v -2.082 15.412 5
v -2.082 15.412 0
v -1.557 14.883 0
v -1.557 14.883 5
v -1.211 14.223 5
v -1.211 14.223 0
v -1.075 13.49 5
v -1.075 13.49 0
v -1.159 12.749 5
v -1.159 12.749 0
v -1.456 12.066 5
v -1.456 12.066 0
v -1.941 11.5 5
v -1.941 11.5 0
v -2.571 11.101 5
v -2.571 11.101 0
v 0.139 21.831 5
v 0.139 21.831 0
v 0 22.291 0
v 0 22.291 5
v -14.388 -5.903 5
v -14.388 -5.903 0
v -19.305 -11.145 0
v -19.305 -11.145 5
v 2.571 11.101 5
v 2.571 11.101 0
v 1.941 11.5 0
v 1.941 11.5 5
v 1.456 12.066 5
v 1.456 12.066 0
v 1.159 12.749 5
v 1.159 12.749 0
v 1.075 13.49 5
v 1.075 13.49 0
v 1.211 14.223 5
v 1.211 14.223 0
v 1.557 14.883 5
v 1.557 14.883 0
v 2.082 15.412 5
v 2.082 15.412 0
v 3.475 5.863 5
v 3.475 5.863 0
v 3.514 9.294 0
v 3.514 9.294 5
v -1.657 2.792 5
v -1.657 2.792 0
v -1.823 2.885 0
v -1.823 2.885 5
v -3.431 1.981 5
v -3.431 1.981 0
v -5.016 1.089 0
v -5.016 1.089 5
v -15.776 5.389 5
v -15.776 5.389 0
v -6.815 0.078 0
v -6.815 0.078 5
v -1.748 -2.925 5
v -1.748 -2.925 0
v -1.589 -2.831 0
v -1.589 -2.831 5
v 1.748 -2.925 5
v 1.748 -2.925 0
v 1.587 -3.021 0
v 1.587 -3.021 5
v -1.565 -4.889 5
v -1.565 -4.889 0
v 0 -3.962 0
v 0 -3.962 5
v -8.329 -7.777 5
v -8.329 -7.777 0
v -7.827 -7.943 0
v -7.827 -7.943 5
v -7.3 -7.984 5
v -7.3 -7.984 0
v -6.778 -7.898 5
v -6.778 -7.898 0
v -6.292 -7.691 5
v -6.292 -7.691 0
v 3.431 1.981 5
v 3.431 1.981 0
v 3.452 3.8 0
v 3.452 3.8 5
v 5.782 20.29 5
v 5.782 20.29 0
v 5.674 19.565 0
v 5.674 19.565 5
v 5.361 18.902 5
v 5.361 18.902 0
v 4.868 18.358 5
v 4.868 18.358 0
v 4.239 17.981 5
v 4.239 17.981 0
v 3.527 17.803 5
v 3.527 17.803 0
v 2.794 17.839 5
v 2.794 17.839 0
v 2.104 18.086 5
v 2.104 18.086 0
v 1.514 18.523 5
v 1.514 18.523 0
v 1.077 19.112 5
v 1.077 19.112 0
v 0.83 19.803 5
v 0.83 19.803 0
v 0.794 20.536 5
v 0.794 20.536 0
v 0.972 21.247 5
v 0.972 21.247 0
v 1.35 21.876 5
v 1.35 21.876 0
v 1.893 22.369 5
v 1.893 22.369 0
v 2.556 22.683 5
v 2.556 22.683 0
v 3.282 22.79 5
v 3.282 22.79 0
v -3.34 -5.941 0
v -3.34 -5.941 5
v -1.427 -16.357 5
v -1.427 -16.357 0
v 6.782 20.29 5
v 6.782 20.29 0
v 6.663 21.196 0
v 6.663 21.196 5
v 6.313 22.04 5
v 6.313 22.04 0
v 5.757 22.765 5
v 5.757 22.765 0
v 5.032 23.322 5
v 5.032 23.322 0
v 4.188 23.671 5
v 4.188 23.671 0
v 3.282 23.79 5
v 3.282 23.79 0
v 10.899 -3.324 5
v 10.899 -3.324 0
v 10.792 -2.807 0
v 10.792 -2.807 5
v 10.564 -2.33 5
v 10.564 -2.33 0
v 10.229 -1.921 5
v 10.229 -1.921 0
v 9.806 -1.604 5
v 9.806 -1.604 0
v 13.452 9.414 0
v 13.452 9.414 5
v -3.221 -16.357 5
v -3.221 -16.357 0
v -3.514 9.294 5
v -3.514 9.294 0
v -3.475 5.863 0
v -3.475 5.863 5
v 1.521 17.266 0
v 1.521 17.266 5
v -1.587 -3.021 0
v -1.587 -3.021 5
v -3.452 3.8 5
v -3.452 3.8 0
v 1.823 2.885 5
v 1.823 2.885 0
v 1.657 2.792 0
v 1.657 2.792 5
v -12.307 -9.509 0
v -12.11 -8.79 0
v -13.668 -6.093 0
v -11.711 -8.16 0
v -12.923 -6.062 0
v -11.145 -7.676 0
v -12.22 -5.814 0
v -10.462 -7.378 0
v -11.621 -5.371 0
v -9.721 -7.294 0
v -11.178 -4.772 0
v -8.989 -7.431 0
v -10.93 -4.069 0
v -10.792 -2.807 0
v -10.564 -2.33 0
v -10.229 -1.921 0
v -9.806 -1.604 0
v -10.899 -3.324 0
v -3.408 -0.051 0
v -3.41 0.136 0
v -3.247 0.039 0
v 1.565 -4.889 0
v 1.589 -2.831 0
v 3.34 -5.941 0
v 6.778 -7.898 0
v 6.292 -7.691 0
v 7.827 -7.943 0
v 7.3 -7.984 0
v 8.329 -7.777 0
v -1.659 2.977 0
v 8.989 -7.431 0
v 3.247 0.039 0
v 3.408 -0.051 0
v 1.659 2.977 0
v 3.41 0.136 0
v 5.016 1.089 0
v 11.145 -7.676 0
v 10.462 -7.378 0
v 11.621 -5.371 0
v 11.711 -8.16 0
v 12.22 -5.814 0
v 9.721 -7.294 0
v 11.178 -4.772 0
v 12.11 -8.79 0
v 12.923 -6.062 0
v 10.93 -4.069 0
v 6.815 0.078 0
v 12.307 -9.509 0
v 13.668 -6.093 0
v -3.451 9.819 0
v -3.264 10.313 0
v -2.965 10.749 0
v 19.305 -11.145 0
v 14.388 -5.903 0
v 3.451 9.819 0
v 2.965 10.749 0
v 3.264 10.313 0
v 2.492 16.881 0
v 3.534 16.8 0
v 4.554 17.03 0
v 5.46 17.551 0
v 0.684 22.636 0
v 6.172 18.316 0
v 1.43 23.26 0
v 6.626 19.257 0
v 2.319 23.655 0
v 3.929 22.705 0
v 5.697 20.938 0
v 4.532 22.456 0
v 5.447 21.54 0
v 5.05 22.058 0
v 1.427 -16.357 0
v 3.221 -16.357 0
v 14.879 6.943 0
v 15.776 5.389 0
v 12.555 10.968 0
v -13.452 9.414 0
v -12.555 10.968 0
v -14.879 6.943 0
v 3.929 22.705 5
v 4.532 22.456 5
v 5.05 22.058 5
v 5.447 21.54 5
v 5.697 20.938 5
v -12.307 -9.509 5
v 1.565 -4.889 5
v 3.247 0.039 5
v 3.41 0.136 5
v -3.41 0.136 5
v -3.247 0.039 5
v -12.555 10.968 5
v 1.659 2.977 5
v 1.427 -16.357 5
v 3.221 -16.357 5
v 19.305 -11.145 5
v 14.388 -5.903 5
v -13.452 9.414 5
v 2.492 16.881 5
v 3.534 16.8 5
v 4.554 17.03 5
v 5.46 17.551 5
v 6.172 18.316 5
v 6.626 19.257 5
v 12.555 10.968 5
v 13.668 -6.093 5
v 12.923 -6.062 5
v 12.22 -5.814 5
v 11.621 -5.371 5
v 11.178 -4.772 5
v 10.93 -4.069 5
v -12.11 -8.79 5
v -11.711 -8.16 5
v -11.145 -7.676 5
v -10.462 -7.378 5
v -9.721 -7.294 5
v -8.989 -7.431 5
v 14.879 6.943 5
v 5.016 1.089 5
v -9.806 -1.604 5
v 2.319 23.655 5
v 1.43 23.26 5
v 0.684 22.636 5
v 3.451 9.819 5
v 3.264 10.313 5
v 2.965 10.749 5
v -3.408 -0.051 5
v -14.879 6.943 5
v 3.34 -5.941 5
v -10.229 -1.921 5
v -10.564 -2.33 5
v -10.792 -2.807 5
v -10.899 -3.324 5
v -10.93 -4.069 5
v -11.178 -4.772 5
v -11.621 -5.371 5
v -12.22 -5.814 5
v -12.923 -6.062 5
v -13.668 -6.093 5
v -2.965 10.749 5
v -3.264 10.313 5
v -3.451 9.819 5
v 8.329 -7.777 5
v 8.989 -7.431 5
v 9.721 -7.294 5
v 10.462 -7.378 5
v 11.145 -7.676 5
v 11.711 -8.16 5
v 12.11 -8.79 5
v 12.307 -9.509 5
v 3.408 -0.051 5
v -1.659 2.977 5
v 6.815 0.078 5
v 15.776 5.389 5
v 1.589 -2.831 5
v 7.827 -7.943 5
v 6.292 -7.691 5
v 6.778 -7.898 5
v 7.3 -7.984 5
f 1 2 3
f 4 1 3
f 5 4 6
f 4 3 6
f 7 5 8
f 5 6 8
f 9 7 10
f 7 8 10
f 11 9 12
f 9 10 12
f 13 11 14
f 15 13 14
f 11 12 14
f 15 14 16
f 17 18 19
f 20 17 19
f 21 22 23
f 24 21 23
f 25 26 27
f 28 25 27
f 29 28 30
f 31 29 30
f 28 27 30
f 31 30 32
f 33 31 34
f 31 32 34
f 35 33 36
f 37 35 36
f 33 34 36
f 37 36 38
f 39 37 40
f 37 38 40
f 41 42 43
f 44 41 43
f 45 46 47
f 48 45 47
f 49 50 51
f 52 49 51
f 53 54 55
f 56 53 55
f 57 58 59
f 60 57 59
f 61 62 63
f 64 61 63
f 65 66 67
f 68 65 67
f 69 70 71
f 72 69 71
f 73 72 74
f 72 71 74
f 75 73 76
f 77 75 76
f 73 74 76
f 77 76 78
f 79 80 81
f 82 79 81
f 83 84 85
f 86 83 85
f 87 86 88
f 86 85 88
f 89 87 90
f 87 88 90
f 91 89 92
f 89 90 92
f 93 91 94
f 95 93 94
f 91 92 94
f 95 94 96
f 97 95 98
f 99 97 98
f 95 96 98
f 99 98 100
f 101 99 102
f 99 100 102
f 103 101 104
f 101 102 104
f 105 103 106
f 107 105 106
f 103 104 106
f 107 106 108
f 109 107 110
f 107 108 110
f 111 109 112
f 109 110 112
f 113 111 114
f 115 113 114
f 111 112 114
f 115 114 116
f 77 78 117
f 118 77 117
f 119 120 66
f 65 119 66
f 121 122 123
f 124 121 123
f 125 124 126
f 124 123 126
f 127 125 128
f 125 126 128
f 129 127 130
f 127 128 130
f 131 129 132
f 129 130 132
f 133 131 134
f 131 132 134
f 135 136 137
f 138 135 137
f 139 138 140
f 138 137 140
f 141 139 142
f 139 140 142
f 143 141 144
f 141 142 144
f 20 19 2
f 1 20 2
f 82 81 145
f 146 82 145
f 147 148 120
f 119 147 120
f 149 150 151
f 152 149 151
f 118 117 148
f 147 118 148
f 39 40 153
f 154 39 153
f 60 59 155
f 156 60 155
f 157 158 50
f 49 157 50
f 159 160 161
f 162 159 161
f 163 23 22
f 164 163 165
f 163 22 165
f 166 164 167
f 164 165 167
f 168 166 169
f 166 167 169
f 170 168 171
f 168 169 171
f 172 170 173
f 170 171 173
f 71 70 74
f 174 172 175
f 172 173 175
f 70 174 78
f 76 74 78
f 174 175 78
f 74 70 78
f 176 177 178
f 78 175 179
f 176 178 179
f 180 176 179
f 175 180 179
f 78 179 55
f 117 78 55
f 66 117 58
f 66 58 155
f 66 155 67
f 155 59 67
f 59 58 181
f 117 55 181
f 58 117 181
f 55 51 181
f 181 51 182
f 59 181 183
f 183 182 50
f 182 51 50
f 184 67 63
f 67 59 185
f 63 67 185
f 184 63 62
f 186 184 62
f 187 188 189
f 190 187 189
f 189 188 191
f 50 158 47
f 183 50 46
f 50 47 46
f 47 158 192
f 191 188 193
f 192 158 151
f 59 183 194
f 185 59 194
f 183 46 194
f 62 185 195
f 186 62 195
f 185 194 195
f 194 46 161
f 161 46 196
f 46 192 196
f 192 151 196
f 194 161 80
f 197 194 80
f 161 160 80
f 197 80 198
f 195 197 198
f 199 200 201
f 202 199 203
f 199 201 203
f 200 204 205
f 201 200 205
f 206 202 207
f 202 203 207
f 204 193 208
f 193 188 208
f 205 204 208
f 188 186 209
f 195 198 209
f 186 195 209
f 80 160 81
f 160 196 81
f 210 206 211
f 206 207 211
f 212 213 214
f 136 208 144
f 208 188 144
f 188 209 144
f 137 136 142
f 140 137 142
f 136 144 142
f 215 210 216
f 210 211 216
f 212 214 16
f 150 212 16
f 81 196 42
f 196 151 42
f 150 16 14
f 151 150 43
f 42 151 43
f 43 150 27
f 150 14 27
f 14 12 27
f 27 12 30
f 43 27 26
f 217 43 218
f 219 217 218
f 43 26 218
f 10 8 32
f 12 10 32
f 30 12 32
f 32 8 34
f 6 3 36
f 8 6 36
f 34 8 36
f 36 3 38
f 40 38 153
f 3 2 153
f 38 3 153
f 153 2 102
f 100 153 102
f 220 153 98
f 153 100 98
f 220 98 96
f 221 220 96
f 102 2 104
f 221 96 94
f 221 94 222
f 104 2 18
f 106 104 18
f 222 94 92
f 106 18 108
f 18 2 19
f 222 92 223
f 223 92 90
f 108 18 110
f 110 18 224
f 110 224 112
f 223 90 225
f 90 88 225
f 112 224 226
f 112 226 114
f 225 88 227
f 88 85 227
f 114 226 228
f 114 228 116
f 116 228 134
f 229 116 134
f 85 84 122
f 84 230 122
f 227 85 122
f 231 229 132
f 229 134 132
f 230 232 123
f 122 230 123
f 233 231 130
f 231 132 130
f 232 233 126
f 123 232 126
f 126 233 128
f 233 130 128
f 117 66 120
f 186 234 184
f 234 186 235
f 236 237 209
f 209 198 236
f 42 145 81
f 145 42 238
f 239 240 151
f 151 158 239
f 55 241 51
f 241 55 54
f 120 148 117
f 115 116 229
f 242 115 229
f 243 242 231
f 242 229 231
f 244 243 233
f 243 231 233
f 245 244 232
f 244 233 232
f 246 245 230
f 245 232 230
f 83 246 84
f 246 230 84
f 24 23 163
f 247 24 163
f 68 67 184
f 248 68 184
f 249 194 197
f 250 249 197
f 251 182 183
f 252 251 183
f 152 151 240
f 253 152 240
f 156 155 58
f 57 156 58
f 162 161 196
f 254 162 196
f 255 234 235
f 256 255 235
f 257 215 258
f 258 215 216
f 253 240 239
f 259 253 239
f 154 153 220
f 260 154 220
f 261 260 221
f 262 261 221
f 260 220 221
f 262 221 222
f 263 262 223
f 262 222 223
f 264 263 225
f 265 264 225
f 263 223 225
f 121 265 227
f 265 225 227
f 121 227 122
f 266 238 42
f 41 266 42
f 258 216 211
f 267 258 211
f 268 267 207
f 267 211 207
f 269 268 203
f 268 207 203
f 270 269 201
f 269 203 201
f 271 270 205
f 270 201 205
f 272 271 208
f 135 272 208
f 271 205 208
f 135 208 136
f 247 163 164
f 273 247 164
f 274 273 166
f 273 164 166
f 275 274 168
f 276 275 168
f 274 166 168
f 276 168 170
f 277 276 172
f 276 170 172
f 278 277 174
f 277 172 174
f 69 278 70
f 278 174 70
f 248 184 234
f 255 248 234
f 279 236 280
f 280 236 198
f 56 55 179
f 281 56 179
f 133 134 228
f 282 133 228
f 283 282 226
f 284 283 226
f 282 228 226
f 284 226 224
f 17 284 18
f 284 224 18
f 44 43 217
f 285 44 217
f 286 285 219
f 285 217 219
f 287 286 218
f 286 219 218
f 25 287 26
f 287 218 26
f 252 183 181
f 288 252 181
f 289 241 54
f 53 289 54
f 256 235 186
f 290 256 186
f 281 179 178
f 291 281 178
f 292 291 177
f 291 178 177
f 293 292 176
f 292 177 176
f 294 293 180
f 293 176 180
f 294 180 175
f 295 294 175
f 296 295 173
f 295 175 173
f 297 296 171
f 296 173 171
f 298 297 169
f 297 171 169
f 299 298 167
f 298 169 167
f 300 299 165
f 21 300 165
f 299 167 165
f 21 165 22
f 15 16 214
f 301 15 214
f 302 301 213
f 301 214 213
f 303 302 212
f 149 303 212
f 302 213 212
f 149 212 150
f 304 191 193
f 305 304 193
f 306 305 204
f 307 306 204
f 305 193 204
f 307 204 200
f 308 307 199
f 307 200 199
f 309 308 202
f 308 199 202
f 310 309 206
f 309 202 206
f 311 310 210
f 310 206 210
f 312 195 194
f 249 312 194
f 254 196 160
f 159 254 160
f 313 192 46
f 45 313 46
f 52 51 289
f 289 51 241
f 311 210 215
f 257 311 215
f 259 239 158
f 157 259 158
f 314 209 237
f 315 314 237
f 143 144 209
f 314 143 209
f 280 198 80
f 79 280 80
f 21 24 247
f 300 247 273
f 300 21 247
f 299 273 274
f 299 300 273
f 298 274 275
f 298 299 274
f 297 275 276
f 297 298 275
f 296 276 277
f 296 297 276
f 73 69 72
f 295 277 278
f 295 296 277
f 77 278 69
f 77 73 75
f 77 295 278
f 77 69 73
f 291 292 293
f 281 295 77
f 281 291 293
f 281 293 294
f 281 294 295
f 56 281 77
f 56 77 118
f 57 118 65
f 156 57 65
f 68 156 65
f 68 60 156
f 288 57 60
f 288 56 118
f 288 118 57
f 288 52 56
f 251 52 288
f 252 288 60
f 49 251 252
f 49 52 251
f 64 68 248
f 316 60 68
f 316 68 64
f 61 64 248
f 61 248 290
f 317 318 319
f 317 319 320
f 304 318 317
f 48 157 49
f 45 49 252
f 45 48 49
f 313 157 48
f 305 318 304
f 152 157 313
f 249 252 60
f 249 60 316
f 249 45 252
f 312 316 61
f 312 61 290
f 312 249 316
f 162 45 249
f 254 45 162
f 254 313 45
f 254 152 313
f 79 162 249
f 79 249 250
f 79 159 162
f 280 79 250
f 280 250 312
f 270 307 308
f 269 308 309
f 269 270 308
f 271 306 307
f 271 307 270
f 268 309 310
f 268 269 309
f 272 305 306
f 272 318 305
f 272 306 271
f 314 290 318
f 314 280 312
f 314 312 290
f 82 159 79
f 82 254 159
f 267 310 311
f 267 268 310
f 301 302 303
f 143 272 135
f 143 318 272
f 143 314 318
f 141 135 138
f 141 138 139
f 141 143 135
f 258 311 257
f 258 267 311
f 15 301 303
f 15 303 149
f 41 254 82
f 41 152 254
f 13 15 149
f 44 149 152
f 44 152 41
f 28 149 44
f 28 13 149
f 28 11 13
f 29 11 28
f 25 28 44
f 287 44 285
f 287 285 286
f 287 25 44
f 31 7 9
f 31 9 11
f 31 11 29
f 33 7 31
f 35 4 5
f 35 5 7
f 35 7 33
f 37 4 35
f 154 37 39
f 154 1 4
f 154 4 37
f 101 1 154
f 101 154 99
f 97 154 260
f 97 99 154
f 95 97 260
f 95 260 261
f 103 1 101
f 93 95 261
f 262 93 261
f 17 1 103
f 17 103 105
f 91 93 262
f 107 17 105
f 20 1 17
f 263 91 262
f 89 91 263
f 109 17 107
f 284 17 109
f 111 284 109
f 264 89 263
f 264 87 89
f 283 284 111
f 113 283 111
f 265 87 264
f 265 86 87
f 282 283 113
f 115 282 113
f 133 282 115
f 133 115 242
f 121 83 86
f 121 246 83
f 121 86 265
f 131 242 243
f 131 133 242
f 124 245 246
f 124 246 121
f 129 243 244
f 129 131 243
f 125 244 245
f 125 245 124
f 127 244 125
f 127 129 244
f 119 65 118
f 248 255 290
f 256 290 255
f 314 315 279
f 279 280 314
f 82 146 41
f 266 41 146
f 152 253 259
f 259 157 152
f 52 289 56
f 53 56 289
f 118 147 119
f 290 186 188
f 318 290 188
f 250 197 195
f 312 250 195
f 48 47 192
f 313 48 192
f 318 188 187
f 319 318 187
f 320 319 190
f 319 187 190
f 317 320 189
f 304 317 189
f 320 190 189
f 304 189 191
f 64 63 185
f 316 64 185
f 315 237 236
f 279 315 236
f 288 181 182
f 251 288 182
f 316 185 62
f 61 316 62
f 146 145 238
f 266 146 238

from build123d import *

# Parameters (mm, degrees)
F1_DEPTH = 5


with BuildPart() as f1:
    # F0 (on Top) → F1 (new body)
    with BuildSketch(Plane.XY):
        Polygon((-3.2212437924, -16.3569749735), (-1.426697038, -16.3569749735), (-1.5647196115, -4.8889417369), (-3.3402717926, -5.9412910774), align=None)
        Polygon((-3.3402717926, -5.9412910774), (-1.5647196115, -4.8889417369), (-1.5872030757, -3.0208334399), (-1.7481957552, -2.9254149319), (-3.3637788423, -3.8842792944), align=None)
        Polygon((-1.5872030757, -3.0208334399), (-1.5647196115, -4.8889417369), (0, -3.9615504336), align=None)
        with BuildLine():
            Line((-6.291840412, -7.6906518244), (-3.3402717926, -5.9412910774))
            Line((-3.3402717926, -5.9412910774), (-3.3637788423, -3.8842792944))
            Line((-3.3637788423, -3.8842792944), (-6.6341785068, -5.8252934798))
            ThreePointArc((-6.6341785068, -5.8252934798), (-7.9635745999, -6.012913211), (-9.0511064637, -5.2256587533))
            ThreePointArc((-9.0511064637, -5.2256587533), (-9.1891228915, -3.8902013029), (-8.3619413914, -2.8327203802))
            Line((-8.3619413914, -2.8327203802), (-5.0457739655, -0.9709782829))
            Line((-5.0457739655, -0.9709782829), (-6.8154449006, 0.0778853107))
            Line((-6.8154449006, 0.0778853107), (-9.8062200576, -1.6035677211))
            ThreePointArc((-9.8062200576, -1.6035677211), (-10.5638950235, -2.3297910167), (-10.8993865535, -3.3242341082))
            ThreePointArc((-10.8993865535, -3.3242341082), (-11.9036748048, -5.6152118935), (-14.3884482062, -5.9034396652))
            Line((-14.3884482062, -5.9034396652), (-19.3045690198, -11.1454981202))
            Line((-19.3045690198, -11.1454981202), (-12.3067528228, -9.509041835))
            ThreePointArc((-12.3067528228, -9.509041835), (-10.8147535498, -7.5012788326), (-8.3285644626, -7.7770285869))
            ThreePointArc((-8.3285644626, -7.7770285869), (-7.2996057177, -7.9837059449), (-6.291840412, -7.6906518244))
        make_face()
        Polygon((-1.589485169, -2.8312186468), (-1.5872030757, -3.0208334399), (0, -3.9615504336), (1.5872030757, -3.0208334399), (1.589485169, -2.8312186468), (0, -1.8878436538), align=None)
        Polygon((1.5872030757, -3.0208334399), (0, -3.9615504336), (1.5647196115, -4.8889417369), align=None)
        Polygon((1.7481957552, -2.9254149319), (1.5872030757, -3.0208334399), (1.5647196115, -4.8889417369), (3.3402717926, -5.9412910774), (3.3637788423, -3.8842792944), align=None)
        Polygon((3.3402717926, -5.9412910774), (1.5647196115, -4.8889417369), (1.426697038, -16.3569749735), (3.2212437924, -16.3569749735), align=None)
        with BuildLine():
            Line((3.3637788423, -3.8842792944), (3.3402717926, -5.9412910774))
            Line((3.3402717926, -5.9412910774), (6.291840412, -7.6906518244))
            ThreePointArc((6.291840412, -7.6906518244), (7.2996057177, -7.9837059449), (8.3285644626, -7.7770285869))
            ThreePointArc((8.3285644626, -7.7770285869), (10.8147535498, -7.5012788326), (12.3067528228, -9.509041835))
            Line((12.3067528228, -9.509041835), (19.3045690198, -11.1454981202))
            Line((19.3045690198, -11.1454981202), (14.3884482062, -5.9034396652))
            ThreePointArc((14.3884482062, -5.9034396652), (11.9036748048, -5.6152118935), (10.8993865535, -3.3242341082))
            ThreePointArc((10.8993865535, -3.3242341082), (10.5638950235, -2.3297910167), (9.8062200576, -1.6035677211))
            Line((9.8062200576, -1.6035677211), (6.8154449006, 0.0778853107))
            Line((6.8154449006, 0.0778853107), (5.0457739655, -0.9709782829))
            Line((5.0457739655, -0.9709782829), (8.3619413914, -2.8327203802))
            ThreePointArc((8.3619413914, -2.8327203802), (9.1891228915, -3.8902013029), (9.0511064637, -5.2256587533))
            ThreePointArc((9.0511064637, -5.2256587533), (7.9635745999, -6.012913211), (6.6341785068, -5.8252934798))
            Line((6.6341785068, -5.8252934798), (3.3637788423, -3.8842792944))
        make_face()
        Polygon((-5.0457739655, -0.9709782829), (-3.4075815252, -0.0512744689), (-3.4097200374, 0.1358585354), (-5.0163075475, 1.0893839351), (-6.8154449006, 0.0778853107), align=None)
        Polygon((-3.2466498563, 0.0390747881), (-1.6349205626, 0.9439218269), (-1.6571646873, 2.7921438587), (-1.8225169617, 2.8849749045), (-3.4308033139, 1.9807752168), (-3.4097200374, 0.1358585354), align=None)
        Polygon((-5.0163075475, 1.0893839351), (-3.4097200374, 0.1358585354), (-3.4308033139, 1.9807752168), align=None)
        Polygon((-15.7761777523, 5.3888085307), (-6.8154449006, 0.0778853107), (-5.0163075475, 1.0893839351), (-14.8789043751, 6.9429316084), align=None)
        Polygon((1.6571646873, 2.7921438587), (1.6349205626, 0.9439218269), (3.2466498563, 0.0390747881), (3.4097200374, 0.1358585354), (3.4308033139, 1.9807752168), (1.8225169617, 2.8849749045), align=None)
        Polygon((3.4097200374, 0.1358585354), (3.4075815252, -0.0512744689), (5.0457739655, -0.9709782829), (6.8154449006, 0.0778853107), (5.0163075475, 1.0893839351), align=None)
        Polygon((-3.451587936, 3.7995578018), (-3.4308033139, 1.9807752168), (-1.8225169617, 2.8849749045), align=None)
        Polygon((-1.8225169617, 2.8849749045), (-1.65938577, 2.9766894007), (-1.6819951232, 4.8552575774), (-3.475173108, 5.8634057666), (-3.451587936, 3.7995578018), align=None)
        Polygon((3.4308033139, 1.9807752168), (3.4097200374, 0.1358585354), (5.0163075475, 1.0893839351), align=None)
        Polygon((5.0163075475, 1.0893839351), (6.8154449006, 0.0778853107), (15.7761777523, 5.3888085307), (14.8789043751, 6.9429316084), align=None)
        Polygon((-13.4522073371, 9.4140433651), (-3.451587936, 3.7995578018), (-3.475173108, 5.8634057666), (-12.5549339599, 10.9681664428), align=None)
        with BuildLine():
            Line((-3.475173108, 5.8634057666), (-1.6819951232, 4.8552575774))
            Line((-1.6819951232, 4.8552575774), (-1.7277628846, 8.65801386))
            ThreePointArc((-1.7277628846, 8.65801386), (-1.2255482916, 9.903114514), (0, 10.4513175066))
            ThreePointArc((0, 10.4513175066), (1.2255482916, 9.903114514), (1.7277628846, 8.65801386))
            Line((1.7277628846, 8.65801386), (1.6819951232, 4.8552575774))
            Line((1.6819951232, 4.8552575774), (3.475173108, 5.8634057666))
            Line((3.475173108, 5.8634057666), (3.5143796456, 9.2942195456))
            ThreePointArc((3.5143796456, 9.2942195456), (3.2642893058, 10.3134969616), (2.570822091, 11.1012626951))
            ThreePointArc((2.570822091, 11.1012626951), (1.088921255, 13.1164907261), (2.0816953833, 15.4124815002))
            Line((2.0816953833, 15.4124815002), (1.5207536328, 17.265992888))
            ThreePointArc((1.5207536328, 17.265992888), (-0.067811393, 19.2766596681), (0.1392845209, 21.8307604932))
            Line((0.1392845209, 21.8307604932), (0, 22.2909962404))
            Line((0, 22.2909962404), (-2.0816953833, 15.4124815002))
            ThreePointArc((-2.0816953833, 15.4124815002), (-1.088921255, 13.1164907261), (-2.570822091, 11.1012626951))
            ThreePointArc((-2.570822091, 11.1012626951), (-3.2642893058, 10.3134969616), (-3.5143796456, 9.2942195456))
            Line((-3.5143796456, 9.2942195456), (-3.475173108, 5.8634057666))
        make_face()
        Polygon((1.6819951232, 4.8552575774), (1.65938577, 2.9766894007), (1.8225169617, 2.8849749045), (3.451587936, 3.7995578018), (3.475173108, 5.8634057666), align=None)
        Polygon((3.451587936, 3.7995578018), (1.8225169617, 2.8849749045), (3.4308033139, 1.9807752168), align=None)
        Polygon((3.475173108, 5.8634057666), (3.451587936, 3.7995578018), (13.4522073371, 9.4140433651), (12.5549339599, 10.9681664428), align=None)
        with BuildLine():
            ThreePointArc((3.2821391693, 23.7904797853), (1.4302458783, 23.2604109695), (0.1392845209, 21.8307604932))
            ThreePointArc((0.1392845209, 21.8307604932), (-0.067811393, 19.2766596681), (1.5207536328, 17.265992888))
            ThreePointArc((1.5207536328, 17.265992888), (5.0264371115, 17.2561059308), (6.7821391693, 20.2904797853))
            ThreePointArc((6.7821391693, 20.2904797853), (5.7570129035, 22.7653535195), (3.2821391693, 23.7904797853))
        make_face()
        with BuildLine():
            ThreePointArc((5.7821391693, 20.2904797853), (1.5143722164, 18.5227128323), (3.2821391693, 22.7904797853))
            ThreePointArc((3.2821391693, 22.7904797853), (5.0499061223, 22.0582467383), (5.7821391693, 20.2904797853))
        make_face(mode=Mode.SUBTRACT)
        Polygon((-1.6819951232, 4.8552575774), (-1.65938577, 2.9766894007), (0, 3.9096178515), align=None)
        Polygon((-1.65938577, 2.9766894007), (-1.6571646873, 2.7921438587), (0, 1.8617887637), (1.6571646873, 2.7921438587), (1.65938577, 2.9766894007), (0, 3.9096178515), align=None)
        Polygon((1.6819951232, 4.8552575774), (0, 3.9096178515), (1.65938577, 2.9766894007), align=None)
        Polygon((-5.0457739655, -0.9709782829), (-3.3858283785, -1.9548089258), (-3.4075815252, -0.0512744689), align=None)
        Polygon((-1.7481957552, -2.9254149319), (-1.589485169, -2.8312186468), (-1.6123563658, -0.9308943818), (-3.2466498563, 0.0390747881), (-3.4075815252, -0.0512744689), (-3.3858283785, -1.9548089258), align=None)
        Polygon((-3.3858283785, -1.9548089258), (-3.3637788423, -3.8842792944), (-1.7481957552, -2.9254149319), align=None)
        Polygon((-1.6571646873, 2.7921438587), (-1.6349205626, 0.9439218269), (0, 1.8617887637), align=None)
        Polygon((-3.2466498563, 0.0390747881), (-1.6123563658, -0.9308943818), (-1.6349205626, 0.9439218269), align=None)
        Polygon((1.6349205626, 0.9439218269), (1.6123563658, -0.9308943818), (3.2466498563, 0.0390747881), align=None)
        Polygon((1.6571646873, 2.7921438587), (0, 1.8617887637), (1.6349205626, 0.9439218269), align=None)
        Polygon((3.4075815252, -0.0512744689), (3.3858283785, -1.9548089258), (5.0457739655, -0.9709782829), align=None)
        Polygon((1.6123563658, -0.9308943818), (1.589485169, -2.8312186468), (1.7481957552, -2.9254149319), (3.3858283785, -1.9548089258), (3.4075815252, -0.0512744689), (3.2466498563, 0.0390747881), align=None)
        Polygon((1.6123563658, -0.9308943818), (0, -1.8878436538), (1.589485169, -2.8312186468), align=None)
        Polygon((-1.6123563658, -0.9308943818), (-1.589485169, -2.8312186468), (0, -1.8878436538), align=None)
        Polygon((3.3858283785, -1.9548089258), (1.7481957552, -2.9254149319), (3.3637788423, -3.8842792944), align=None)
        with BuildLine():
            Line((-1.7277628846, 8.65801386), (-1.6819951232, 4.8552575774))
            Line((-1.6819951232, 4.8552575774), (0, 3.9096178515))
            Line((0, 3.9096178515), (1.6819951232, 4.8552575774))
            Line((1.6819951232, 4.8552575774), (1.7277628846, 8.65801386))
            ThreePointArc((1.7277628846, 8.65801386), (1.2255482916, 9.903114514), (0, 10.4513175066))
            ThreePointArc((0, 10.4513175066), (-1.2255482916, 9.903114514), (-1.7277628846, 8.65801386))
        make_face()
        Polygon((-1.6349205626, 0.9439218269), (-1.6123563658, -0.9308943818), (0, -1.8878436538), (1.6123563658, -0.9308943818), (1.6349205626, 0.9439218269), (0, 1.8617887637), align=None)
        with BuildLine():
            Line((-6.6341785068, -5.8252934798), (-3.3637788423, -3.8842792944))
            Line((-3.3637788423, -3.8842792944), (-3.3858283785, -1.9548089258))
            Line((-3.3858283785, -1.9548089258), (-5.0457739655, -0.9709782829))
            Line((-5.0457739655, -0.9709782829), (-8.3619413914, -2.8327203802))
            ThreePointArc((-8.3619413914, -2.8327203802), (-9.1891228915, -3.8902013029), (-9.0511064637, -5.2256587533))
            ThreePointArc((-9.0511064637, -5.2256587533), (-7.9635745999, -6.012913211), (-6.6341785068, -5.8252934798))
        make_face()
        with BuildLine():
            Line((5.0457739655, -0.9709782829), (3.3858283785, -1.9548089258))
            Line((3.3858283785, -1.9548089258), (3.3637788423, -3.8842792944))
            Line((3.3637788423, -3.8842792944), (6.6341785068, -5.8252934798))
            ThreePointArc((6.6341785068, -5.8252934798), (7.9635745999, -6.012913211), (9.0511064637, -5.2256587533))
            ThreePointArc((9.0511064637, -5.2256587533), (9.1891228915, -3.8902013029), (8.3619413914, -2.8327203802))
            Line((8.3619413914, -2.8327203802), (5.0457739655, -0.9709782829))
        make_face()
    extrude(amount=F1_DEPTH)


solid = f1.part
